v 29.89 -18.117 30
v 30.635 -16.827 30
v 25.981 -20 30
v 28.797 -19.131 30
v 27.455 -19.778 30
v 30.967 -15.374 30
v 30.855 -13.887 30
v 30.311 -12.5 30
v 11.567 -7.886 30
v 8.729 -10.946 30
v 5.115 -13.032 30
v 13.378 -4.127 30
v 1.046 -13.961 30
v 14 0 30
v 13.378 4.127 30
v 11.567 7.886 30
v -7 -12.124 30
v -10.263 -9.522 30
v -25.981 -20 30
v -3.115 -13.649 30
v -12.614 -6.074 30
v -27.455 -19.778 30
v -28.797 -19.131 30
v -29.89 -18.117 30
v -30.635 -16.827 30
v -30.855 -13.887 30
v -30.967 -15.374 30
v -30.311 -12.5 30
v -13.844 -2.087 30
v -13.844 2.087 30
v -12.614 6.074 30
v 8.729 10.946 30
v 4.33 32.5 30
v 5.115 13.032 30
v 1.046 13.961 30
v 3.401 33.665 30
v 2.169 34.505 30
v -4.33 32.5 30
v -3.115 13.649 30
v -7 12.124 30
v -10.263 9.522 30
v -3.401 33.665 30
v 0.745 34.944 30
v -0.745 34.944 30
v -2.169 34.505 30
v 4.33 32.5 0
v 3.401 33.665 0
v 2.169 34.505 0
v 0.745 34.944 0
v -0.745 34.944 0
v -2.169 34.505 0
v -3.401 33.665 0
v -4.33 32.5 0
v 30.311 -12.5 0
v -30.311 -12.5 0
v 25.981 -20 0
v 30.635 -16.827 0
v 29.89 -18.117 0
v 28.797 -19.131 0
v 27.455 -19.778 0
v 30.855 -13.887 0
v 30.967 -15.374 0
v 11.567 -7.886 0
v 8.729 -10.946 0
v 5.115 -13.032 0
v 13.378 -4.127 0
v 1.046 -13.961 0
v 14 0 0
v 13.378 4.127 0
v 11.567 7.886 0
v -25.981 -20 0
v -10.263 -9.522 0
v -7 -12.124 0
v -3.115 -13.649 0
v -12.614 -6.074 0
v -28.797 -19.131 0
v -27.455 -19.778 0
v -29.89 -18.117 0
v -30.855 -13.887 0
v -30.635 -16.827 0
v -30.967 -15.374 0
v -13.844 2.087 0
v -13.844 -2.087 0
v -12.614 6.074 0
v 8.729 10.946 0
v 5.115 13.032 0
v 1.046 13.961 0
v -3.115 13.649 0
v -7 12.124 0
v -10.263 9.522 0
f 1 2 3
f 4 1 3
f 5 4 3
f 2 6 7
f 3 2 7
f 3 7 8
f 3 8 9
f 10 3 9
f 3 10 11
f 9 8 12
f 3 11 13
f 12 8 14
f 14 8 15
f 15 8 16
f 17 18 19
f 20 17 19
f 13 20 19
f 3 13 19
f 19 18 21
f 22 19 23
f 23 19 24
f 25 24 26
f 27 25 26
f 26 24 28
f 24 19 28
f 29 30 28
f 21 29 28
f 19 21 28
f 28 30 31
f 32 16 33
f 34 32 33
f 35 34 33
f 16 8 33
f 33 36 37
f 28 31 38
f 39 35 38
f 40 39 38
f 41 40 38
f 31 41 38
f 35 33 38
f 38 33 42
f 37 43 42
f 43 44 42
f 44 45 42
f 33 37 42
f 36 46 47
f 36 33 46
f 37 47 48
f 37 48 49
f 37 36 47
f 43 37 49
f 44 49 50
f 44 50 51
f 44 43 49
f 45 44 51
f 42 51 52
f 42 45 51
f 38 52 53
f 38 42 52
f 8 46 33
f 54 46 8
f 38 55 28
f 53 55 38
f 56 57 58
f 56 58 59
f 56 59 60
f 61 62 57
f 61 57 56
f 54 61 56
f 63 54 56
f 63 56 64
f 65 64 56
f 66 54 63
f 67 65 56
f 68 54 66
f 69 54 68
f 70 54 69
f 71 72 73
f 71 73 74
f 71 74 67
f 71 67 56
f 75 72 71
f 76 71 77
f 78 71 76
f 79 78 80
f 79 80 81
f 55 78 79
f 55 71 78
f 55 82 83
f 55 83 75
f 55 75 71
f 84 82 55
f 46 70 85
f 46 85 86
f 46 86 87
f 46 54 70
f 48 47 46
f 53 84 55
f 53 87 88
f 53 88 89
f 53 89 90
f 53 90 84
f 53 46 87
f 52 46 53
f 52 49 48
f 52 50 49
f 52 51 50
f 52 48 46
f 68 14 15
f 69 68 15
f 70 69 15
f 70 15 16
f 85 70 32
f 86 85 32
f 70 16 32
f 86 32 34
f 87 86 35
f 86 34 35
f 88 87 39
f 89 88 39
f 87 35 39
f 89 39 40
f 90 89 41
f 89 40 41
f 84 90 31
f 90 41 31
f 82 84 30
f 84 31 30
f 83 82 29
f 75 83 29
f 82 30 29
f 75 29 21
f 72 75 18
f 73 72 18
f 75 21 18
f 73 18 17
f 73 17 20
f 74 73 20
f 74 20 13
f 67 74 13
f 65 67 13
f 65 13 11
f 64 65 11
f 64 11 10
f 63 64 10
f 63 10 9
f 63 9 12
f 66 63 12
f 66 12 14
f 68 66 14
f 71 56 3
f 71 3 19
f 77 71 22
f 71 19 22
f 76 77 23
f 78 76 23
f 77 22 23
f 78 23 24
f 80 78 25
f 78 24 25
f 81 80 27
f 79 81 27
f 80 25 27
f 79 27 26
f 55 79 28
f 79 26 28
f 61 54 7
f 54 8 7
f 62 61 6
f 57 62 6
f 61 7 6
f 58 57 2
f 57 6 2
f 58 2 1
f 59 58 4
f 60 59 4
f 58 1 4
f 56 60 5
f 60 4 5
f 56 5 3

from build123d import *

# Parameters (mm, degrees)
BOSS_EXTRUDE1_DEPTH = 30
FILLET1_R           = 5
SKETCH2_R           = 14
CUT_EXTRUDE1_DEPTH  = 56.541044473


with BuildPart() as part:
    # Sketch1 → Boss-Extrude1 (new body)
    with BuildSketch(Plane.XY):
        Polygon((0, 40), (34.641016151, -20), (-34.641016151, -20), align=None)
    extrude(amount=BOSS_EXTRUDE1_DEPTH)

    # Fillet1
    fillet1_edges = [part.edges().sort_by_distance(p)[0] for p in [
        (0, 40, 15),
        (34.641016151, -20, 15),
        (-34.641016151, -20, 15),
    ]]
    fillet(fillet1_edges, radius=FILLET1_R)

    # Sketch2 → Cut-Extrude1 (cut, through all)
    with BuildSketch(Plane.XY.offset(30)):
        Circle(SKETCH2_R)
    extrude(amount=-CUT_EXTRUDE1_DEPTH, mode=Mode.SUBTRACT)


solid = part.part
